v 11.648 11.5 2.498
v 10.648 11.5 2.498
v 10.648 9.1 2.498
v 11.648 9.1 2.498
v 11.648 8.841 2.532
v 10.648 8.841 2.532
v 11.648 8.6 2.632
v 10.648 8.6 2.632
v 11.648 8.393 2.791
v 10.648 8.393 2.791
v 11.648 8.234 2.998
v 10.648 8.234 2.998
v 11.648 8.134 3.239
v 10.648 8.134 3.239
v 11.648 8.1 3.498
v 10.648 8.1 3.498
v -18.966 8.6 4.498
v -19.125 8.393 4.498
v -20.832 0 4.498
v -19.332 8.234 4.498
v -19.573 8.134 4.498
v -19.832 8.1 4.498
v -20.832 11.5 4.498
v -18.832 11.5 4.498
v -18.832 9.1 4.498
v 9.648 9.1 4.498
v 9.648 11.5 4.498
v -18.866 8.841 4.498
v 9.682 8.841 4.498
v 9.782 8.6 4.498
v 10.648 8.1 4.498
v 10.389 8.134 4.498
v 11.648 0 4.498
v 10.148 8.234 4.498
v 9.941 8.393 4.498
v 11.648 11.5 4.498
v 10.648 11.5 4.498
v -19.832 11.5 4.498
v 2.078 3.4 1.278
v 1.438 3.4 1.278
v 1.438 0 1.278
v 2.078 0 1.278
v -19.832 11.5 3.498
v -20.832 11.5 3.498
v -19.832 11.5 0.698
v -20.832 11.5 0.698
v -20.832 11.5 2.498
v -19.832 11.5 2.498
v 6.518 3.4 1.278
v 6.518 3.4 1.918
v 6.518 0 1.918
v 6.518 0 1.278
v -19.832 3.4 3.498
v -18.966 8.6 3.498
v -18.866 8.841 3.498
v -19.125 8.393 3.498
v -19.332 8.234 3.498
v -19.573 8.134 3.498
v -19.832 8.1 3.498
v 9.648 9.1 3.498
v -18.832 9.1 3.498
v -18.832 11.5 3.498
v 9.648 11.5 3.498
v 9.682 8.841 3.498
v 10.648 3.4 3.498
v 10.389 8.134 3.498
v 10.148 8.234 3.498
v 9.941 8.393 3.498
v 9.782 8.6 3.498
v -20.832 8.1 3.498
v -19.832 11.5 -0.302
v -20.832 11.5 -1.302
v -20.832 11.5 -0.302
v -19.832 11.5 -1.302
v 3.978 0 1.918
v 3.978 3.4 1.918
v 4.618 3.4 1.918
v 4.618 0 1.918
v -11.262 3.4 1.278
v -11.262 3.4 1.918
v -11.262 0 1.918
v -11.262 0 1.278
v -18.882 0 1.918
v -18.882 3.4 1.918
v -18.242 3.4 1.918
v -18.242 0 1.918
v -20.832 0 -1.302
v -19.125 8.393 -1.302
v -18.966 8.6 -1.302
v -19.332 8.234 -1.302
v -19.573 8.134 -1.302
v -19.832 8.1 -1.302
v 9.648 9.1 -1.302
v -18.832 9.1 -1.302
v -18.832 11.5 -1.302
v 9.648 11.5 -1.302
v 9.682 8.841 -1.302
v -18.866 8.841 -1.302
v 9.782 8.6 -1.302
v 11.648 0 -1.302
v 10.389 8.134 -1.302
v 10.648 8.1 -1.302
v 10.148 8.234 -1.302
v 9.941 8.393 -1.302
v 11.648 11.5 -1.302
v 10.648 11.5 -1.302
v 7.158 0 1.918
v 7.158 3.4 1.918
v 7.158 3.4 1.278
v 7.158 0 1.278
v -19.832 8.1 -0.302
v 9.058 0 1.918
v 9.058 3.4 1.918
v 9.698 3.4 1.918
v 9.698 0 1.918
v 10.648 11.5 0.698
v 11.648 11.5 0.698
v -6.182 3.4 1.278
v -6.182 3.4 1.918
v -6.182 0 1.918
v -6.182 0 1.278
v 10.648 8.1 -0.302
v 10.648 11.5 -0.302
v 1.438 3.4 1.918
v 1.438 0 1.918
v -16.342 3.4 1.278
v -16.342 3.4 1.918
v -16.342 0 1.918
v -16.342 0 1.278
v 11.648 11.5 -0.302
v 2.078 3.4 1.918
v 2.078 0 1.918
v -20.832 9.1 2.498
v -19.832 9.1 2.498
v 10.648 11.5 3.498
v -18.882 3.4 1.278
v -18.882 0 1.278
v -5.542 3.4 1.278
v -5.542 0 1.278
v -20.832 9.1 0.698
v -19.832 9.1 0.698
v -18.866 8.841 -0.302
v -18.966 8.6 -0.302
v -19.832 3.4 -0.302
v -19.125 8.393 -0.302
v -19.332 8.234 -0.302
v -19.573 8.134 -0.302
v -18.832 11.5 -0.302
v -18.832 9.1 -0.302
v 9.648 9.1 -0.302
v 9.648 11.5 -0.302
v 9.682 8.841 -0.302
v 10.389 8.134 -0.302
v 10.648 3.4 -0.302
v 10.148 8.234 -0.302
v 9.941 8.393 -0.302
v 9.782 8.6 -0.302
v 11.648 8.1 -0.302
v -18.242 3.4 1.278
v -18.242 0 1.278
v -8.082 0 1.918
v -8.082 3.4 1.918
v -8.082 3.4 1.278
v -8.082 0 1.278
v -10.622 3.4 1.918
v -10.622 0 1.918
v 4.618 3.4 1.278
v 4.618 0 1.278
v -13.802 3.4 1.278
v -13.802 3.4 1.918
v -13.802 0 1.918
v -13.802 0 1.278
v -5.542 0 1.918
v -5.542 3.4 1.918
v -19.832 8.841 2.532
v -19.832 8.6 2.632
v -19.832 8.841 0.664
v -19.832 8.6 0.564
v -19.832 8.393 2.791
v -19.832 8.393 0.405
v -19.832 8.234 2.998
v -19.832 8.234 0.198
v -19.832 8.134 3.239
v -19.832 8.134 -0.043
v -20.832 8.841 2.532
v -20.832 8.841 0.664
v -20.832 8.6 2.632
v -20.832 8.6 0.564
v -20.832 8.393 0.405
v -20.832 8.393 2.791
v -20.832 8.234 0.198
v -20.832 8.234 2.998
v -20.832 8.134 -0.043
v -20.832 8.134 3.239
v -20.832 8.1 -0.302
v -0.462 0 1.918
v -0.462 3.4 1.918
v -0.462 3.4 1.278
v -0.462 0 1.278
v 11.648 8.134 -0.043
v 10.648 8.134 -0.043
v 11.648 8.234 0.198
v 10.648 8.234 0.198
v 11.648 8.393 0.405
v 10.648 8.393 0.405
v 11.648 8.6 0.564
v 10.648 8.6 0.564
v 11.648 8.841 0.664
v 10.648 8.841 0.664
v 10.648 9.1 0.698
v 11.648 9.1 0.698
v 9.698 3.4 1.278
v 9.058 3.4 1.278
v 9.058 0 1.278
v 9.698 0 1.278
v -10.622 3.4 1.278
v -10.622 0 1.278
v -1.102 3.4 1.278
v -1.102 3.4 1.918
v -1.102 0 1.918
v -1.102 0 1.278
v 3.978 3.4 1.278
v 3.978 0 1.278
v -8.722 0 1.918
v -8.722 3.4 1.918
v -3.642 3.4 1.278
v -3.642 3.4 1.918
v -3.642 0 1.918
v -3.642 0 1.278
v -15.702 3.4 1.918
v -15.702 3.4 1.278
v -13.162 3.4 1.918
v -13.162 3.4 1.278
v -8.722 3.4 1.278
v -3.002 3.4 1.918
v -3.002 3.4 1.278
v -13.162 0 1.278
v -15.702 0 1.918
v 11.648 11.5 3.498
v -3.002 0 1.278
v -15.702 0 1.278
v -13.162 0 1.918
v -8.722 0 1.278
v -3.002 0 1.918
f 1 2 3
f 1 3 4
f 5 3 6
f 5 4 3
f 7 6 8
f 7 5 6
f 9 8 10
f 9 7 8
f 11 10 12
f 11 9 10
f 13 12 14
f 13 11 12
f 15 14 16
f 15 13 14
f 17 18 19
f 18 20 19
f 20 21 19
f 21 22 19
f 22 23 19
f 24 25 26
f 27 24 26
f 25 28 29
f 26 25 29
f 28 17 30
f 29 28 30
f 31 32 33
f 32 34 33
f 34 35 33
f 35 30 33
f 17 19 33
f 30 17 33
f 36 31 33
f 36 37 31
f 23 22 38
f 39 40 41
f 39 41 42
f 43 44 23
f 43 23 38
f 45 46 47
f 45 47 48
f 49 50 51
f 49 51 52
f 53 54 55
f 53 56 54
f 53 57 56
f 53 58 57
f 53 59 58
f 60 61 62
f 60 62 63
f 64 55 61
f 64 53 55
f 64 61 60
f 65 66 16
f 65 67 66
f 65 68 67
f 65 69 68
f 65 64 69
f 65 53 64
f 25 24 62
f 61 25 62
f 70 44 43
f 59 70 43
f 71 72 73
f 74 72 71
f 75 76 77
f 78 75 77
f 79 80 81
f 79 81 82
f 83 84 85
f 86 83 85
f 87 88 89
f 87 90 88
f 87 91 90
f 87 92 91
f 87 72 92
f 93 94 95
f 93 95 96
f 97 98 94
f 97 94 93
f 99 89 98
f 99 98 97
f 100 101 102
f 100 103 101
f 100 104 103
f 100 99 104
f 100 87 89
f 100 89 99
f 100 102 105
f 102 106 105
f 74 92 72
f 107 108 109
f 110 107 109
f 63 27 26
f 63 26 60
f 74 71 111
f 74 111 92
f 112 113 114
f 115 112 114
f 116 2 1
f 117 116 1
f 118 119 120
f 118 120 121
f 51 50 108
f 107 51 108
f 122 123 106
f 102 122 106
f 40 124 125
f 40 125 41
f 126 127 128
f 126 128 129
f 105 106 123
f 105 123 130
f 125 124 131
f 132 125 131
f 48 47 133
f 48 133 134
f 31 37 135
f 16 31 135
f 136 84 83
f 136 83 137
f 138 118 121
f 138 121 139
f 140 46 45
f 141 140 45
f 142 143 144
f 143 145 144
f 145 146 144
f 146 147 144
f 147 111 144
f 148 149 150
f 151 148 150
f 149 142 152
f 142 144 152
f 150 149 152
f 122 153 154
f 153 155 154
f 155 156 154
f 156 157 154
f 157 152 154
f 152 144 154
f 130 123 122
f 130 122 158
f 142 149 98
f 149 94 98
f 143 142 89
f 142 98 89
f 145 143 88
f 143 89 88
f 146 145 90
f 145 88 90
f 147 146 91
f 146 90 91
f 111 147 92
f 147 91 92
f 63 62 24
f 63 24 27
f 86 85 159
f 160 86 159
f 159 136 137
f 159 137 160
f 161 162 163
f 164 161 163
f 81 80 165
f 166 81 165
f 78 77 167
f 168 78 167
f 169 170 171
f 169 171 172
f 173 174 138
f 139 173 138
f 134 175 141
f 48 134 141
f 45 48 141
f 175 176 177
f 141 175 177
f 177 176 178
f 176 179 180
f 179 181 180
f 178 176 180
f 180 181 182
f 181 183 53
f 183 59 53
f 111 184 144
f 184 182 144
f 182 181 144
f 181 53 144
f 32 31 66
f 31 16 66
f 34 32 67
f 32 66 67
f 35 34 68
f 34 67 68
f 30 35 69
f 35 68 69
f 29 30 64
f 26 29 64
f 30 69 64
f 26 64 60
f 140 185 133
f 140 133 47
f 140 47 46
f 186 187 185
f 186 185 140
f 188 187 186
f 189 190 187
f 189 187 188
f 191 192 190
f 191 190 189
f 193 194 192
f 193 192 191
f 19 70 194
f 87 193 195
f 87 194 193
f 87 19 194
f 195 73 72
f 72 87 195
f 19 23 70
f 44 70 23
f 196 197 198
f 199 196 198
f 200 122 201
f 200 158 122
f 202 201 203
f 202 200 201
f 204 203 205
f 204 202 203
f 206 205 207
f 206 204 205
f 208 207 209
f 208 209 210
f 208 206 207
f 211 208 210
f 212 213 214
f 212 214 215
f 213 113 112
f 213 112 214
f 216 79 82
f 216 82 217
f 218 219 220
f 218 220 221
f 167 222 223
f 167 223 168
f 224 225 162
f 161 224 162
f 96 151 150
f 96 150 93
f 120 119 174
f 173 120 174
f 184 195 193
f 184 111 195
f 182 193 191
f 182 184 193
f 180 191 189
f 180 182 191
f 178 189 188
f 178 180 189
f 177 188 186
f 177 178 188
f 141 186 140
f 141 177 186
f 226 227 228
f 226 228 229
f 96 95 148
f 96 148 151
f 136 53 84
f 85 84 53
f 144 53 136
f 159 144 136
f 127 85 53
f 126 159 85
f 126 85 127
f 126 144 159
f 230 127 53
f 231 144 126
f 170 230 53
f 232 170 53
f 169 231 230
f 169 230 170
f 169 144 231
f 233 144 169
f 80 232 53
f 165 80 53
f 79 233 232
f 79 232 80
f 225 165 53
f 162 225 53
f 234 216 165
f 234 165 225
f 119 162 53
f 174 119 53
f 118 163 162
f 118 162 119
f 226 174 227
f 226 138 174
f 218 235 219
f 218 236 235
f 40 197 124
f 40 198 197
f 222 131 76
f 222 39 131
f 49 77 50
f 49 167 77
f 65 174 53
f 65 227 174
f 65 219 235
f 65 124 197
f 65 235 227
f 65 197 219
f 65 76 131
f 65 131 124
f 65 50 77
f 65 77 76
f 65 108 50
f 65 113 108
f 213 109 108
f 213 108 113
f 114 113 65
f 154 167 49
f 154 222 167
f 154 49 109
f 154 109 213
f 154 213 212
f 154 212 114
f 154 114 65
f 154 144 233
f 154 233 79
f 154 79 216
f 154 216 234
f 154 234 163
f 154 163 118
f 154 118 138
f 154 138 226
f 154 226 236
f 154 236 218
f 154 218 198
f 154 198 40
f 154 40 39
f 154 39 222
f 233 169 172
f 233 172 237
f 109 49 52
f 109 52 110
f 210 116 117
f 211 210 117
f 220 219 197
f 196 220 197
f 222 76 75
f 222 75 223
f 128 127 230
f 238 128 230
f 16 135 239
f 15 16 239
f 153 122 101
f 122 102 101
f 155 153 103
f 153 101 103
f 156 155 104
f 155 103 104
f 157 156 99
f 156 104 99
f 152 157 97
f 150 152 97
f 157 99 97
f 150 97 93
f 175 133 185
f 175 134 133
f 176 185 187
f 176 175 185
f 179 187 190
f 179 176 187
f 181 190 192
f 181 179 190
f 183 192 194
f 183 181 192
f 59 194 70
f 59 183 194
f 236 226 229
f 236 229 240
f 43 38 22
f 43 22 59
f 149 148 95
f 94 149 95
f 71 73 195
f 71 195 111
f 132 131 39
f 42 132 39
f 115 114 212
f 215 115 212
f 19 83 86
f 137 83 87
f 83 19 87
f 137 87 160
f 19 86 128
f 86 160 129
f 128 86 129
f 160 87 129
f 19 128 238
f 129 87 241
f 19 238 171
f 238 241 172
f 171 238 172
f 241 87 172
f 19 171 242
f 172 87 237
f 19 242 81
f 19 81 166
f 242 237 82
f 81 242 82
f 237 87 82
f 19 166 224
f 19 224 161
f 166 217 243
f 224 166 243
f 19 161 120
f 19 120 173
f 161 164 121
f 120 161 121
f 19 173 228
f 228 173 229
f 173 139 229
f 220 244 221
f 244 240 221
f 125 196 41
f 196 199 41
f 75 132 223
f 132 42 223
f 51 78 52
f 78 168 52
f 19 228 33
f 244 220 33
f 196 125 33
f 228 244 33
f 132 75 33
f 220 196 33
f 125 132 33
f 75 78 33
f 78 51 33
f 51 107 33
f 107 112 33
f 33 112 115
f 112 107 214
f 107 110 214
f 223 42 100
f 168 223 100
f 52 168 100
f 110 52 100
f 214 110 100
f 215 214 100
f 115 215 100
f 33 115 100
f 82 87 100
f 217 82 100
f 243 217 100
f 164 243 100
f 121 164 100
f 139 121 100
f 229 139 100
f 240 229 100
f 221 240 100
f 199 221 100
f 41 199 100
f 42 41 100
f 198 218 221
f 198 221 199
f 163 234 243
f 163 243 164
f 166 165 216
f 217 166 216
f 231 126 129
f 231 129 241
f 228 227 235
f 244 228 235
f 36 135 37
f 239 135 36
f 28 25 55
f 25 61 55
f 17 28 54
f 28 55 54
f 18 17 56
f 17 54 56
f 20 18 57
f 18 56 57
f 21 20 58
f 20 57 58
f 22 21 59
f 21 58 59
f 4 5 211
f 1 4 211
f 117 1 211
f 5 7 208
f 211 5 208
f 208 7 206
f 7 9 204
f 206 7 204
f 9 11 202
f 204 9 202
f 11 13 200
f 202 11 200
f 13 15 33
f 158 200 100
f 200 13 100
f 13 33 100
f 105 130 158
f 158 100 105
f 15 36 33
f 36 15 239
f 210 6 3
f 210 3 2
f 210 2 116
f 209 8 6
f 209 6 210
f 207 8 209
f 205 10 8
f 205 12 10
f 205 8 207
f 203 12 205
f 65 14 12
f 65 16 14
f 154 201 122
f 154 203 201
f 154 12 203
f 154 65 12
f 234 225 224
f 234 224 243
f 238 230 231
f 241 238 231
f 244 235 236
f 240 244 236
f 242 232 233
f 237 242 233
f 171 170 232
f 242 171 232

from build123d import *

# Parameters (mm, degrees)
SZKIC1_W                    = 32.48
SZKIC1_H                    = 5.8
DODANIE_WYCI_GNI_CIE1_DEPTH = 3.4
SZKIC2_W                    = 0.64
SZKIC2_H                    = 0.64
WYTNIJ_WYCI_GNI_CIE1_DEPTH  = 3.4
SZKIC3_W                    = 32.48
SZKIC3_H                    = 5.8
SZKIC3_W_2                  = 30.48
SZKIC3_H_2                  = 3.8
DODANIE_WYCI_GNI_CIE2_DEPTH = 8.1
SZKIC4_W                    = 1
SZKIC4_H                    = 1
WYTNIJ_WYCI_GNI_CIE2_DEPTH  = 3.4
ZAOKR_GLENIE1_R             = 1


with BuildPart() as part:
    # Szkic1 → Dodanie-wyciągnięcie1 (new body)
    with BuildSketch(Plane(origin=(0, 0, 0), x_dir=(1, 0, 0), z_dir=(0, 1, 0))):
        with Locations((-4.592060125, -1.597771029)):
            Rectangle(SZKIC1_W, SZKIC1_H)
    extrude(amount=DODANIE_WYCI_GNI_CIE1_DEPTH)

    # Szkic2 → Wytnij-wyciągnięcie1 (cut)
    with BuildSketch(Plane(origin=(0, 3.4, 0), x_dir=(1, 0, 0), z_dir=(0, 1, 0))):
        with Locations((-18.562060125, -1.597771029)):
            Rectangle(SZKIC2_W, SZKIC2_H)
        with Locations((-16.022060125, -1.597771029)):
            Rectangle(SZKIC2_W, SZKIC2_H)
        with Locations((-13.482060125, -1.597771029)):
            Rectangle(SZKIC2_W, SZKIC2_H)
        with Locations((-10.942060125, -1.597771029)):
            Rectangle(SZKIC2_W, SZKIC2_H)
        with Locations((-8.402060125, -1.597771029)):
            Rectangle(SZKIC2_W, SZKIC2_H)
        with Locations((-5.862060125, -1.597771029)):
            Rectangle(SZKIC2_W, SZKIC2_H)
        with Locations((-3.322060125, -1.597771029)):
            Rectangle(SZKIC2_W, SZKIC2_H)
        with Locations((-0.782060125, -1.597771029)):
            Rectangle(SZKIC2_W, SZKIC2_H)
        with Locations((1.757939875, -1.597771029)):
            Rectangle(SZKIC2_W, SZKIC2_H)
        with Locations((4.297939875, -1.597771029)):
            Rectangle(SZKIC2_W, SZKIC2_H)
        with Locations((6.837939875, -1.597771029)):
            Rectangle(SZKIC2_W, SZKIC2_H)
        with Locations((9.377939875, -1.597771029)):
            Rectangle(SZKIC2_W, SZKIC2_H)
    extrude(amount=-WYTNIJ_WYCI_GNI_CIE1_DEPTH, mode=Mode.SUBTRACT)

    # Szkic3 → Dodanie-wyciągnięcie2 (add)
    with BuildSketch(Plane(origin=(0, 3.4, 0), x_dir=(1, 0, 0), z_dir=(0, 1, 0))):
        with Locations((-4.592060125, -1.597771029)):
            Rectangle(SZKIC3_W, SZKIC3_H)
        with Locations((-4.592060125, -1.597771029)):
            Rectangle(SZKIC3_W_2, SZKIC3_H_2, mode=Mode.SUBTRACT)
    extrude(amount=DODANIE_WYCI_GNI_CIE2_DEPTH)

    # Szkic4 → Wytnij-wyciągnięcie2 (cut)
    with BuildSketch(Plane(origin=(0, 11.5, 0), x_dir=(1, 0, 0), z_dir=(0, 1, 0))):
        with Locations((-20.332060125, -2.997771029)):
            Rectangle(SZKIC4_W, SZKIC4_H)
        with Locations((-19.332060125, -3.997771029)):
            Rectangle(SZKIC4_W, SZKIC4_H)
        with Locations((-20.332060125, -0.197771029)):
            Rectangle(SZKIC4_W, SZKIC4_H)
        with Locations((-19.332060125, 0.802228971)):
            Rectangle(SZKIC4_W, SZKIC4_H)
        with Locations((10.147939875, 0.802228971)):
            Rectangle(SZKIC4_W, SZKIC4_H)
        with Locations((11.147939875, -0.197771029)):
            Rectangle(SZKIC4_W, SZKIC4_H)
        with Locations((11.147939875, -2.997771029)):
            Rectangle(SZKIC4_W, SZKIC4_H)
        with Locations((10.147939875, -3.997771029)):
            Rectangle(SZKIC4_W, SZKIC4_H)
    extrude(amount=-WYTNIJ_WYCI_GNI_CIE2_DEPTH, mode=Mode.SUBTRACT)

    # Zaokrąglenie1
    zaokr_glenie1_edges = [part.edges().sort_by_distance(p)[0] for p in [
        (11.147939875, 8.1, 2.497771029),
        (11.147939875, 8.1, 0.697771029),
        (9.647939875, 8.1, -0.802228971),
        (9.647939875, 8.1, 3.997771029),
        (-18.832060125, 8.1, -0.802228971),
        (-20.332060125, 8.1, 0.697771029),
        (-20.332060125, 8.1, 2.497771029),
        (-18.832060125, 8.1, 3.997771029),
    ]]
    fillet(zaokr_glenie1_edges, radius=ZAOKR_GLENIE1_R - 0.0001)  # a hair under: the kernel refuses the full size


solid = part.part
